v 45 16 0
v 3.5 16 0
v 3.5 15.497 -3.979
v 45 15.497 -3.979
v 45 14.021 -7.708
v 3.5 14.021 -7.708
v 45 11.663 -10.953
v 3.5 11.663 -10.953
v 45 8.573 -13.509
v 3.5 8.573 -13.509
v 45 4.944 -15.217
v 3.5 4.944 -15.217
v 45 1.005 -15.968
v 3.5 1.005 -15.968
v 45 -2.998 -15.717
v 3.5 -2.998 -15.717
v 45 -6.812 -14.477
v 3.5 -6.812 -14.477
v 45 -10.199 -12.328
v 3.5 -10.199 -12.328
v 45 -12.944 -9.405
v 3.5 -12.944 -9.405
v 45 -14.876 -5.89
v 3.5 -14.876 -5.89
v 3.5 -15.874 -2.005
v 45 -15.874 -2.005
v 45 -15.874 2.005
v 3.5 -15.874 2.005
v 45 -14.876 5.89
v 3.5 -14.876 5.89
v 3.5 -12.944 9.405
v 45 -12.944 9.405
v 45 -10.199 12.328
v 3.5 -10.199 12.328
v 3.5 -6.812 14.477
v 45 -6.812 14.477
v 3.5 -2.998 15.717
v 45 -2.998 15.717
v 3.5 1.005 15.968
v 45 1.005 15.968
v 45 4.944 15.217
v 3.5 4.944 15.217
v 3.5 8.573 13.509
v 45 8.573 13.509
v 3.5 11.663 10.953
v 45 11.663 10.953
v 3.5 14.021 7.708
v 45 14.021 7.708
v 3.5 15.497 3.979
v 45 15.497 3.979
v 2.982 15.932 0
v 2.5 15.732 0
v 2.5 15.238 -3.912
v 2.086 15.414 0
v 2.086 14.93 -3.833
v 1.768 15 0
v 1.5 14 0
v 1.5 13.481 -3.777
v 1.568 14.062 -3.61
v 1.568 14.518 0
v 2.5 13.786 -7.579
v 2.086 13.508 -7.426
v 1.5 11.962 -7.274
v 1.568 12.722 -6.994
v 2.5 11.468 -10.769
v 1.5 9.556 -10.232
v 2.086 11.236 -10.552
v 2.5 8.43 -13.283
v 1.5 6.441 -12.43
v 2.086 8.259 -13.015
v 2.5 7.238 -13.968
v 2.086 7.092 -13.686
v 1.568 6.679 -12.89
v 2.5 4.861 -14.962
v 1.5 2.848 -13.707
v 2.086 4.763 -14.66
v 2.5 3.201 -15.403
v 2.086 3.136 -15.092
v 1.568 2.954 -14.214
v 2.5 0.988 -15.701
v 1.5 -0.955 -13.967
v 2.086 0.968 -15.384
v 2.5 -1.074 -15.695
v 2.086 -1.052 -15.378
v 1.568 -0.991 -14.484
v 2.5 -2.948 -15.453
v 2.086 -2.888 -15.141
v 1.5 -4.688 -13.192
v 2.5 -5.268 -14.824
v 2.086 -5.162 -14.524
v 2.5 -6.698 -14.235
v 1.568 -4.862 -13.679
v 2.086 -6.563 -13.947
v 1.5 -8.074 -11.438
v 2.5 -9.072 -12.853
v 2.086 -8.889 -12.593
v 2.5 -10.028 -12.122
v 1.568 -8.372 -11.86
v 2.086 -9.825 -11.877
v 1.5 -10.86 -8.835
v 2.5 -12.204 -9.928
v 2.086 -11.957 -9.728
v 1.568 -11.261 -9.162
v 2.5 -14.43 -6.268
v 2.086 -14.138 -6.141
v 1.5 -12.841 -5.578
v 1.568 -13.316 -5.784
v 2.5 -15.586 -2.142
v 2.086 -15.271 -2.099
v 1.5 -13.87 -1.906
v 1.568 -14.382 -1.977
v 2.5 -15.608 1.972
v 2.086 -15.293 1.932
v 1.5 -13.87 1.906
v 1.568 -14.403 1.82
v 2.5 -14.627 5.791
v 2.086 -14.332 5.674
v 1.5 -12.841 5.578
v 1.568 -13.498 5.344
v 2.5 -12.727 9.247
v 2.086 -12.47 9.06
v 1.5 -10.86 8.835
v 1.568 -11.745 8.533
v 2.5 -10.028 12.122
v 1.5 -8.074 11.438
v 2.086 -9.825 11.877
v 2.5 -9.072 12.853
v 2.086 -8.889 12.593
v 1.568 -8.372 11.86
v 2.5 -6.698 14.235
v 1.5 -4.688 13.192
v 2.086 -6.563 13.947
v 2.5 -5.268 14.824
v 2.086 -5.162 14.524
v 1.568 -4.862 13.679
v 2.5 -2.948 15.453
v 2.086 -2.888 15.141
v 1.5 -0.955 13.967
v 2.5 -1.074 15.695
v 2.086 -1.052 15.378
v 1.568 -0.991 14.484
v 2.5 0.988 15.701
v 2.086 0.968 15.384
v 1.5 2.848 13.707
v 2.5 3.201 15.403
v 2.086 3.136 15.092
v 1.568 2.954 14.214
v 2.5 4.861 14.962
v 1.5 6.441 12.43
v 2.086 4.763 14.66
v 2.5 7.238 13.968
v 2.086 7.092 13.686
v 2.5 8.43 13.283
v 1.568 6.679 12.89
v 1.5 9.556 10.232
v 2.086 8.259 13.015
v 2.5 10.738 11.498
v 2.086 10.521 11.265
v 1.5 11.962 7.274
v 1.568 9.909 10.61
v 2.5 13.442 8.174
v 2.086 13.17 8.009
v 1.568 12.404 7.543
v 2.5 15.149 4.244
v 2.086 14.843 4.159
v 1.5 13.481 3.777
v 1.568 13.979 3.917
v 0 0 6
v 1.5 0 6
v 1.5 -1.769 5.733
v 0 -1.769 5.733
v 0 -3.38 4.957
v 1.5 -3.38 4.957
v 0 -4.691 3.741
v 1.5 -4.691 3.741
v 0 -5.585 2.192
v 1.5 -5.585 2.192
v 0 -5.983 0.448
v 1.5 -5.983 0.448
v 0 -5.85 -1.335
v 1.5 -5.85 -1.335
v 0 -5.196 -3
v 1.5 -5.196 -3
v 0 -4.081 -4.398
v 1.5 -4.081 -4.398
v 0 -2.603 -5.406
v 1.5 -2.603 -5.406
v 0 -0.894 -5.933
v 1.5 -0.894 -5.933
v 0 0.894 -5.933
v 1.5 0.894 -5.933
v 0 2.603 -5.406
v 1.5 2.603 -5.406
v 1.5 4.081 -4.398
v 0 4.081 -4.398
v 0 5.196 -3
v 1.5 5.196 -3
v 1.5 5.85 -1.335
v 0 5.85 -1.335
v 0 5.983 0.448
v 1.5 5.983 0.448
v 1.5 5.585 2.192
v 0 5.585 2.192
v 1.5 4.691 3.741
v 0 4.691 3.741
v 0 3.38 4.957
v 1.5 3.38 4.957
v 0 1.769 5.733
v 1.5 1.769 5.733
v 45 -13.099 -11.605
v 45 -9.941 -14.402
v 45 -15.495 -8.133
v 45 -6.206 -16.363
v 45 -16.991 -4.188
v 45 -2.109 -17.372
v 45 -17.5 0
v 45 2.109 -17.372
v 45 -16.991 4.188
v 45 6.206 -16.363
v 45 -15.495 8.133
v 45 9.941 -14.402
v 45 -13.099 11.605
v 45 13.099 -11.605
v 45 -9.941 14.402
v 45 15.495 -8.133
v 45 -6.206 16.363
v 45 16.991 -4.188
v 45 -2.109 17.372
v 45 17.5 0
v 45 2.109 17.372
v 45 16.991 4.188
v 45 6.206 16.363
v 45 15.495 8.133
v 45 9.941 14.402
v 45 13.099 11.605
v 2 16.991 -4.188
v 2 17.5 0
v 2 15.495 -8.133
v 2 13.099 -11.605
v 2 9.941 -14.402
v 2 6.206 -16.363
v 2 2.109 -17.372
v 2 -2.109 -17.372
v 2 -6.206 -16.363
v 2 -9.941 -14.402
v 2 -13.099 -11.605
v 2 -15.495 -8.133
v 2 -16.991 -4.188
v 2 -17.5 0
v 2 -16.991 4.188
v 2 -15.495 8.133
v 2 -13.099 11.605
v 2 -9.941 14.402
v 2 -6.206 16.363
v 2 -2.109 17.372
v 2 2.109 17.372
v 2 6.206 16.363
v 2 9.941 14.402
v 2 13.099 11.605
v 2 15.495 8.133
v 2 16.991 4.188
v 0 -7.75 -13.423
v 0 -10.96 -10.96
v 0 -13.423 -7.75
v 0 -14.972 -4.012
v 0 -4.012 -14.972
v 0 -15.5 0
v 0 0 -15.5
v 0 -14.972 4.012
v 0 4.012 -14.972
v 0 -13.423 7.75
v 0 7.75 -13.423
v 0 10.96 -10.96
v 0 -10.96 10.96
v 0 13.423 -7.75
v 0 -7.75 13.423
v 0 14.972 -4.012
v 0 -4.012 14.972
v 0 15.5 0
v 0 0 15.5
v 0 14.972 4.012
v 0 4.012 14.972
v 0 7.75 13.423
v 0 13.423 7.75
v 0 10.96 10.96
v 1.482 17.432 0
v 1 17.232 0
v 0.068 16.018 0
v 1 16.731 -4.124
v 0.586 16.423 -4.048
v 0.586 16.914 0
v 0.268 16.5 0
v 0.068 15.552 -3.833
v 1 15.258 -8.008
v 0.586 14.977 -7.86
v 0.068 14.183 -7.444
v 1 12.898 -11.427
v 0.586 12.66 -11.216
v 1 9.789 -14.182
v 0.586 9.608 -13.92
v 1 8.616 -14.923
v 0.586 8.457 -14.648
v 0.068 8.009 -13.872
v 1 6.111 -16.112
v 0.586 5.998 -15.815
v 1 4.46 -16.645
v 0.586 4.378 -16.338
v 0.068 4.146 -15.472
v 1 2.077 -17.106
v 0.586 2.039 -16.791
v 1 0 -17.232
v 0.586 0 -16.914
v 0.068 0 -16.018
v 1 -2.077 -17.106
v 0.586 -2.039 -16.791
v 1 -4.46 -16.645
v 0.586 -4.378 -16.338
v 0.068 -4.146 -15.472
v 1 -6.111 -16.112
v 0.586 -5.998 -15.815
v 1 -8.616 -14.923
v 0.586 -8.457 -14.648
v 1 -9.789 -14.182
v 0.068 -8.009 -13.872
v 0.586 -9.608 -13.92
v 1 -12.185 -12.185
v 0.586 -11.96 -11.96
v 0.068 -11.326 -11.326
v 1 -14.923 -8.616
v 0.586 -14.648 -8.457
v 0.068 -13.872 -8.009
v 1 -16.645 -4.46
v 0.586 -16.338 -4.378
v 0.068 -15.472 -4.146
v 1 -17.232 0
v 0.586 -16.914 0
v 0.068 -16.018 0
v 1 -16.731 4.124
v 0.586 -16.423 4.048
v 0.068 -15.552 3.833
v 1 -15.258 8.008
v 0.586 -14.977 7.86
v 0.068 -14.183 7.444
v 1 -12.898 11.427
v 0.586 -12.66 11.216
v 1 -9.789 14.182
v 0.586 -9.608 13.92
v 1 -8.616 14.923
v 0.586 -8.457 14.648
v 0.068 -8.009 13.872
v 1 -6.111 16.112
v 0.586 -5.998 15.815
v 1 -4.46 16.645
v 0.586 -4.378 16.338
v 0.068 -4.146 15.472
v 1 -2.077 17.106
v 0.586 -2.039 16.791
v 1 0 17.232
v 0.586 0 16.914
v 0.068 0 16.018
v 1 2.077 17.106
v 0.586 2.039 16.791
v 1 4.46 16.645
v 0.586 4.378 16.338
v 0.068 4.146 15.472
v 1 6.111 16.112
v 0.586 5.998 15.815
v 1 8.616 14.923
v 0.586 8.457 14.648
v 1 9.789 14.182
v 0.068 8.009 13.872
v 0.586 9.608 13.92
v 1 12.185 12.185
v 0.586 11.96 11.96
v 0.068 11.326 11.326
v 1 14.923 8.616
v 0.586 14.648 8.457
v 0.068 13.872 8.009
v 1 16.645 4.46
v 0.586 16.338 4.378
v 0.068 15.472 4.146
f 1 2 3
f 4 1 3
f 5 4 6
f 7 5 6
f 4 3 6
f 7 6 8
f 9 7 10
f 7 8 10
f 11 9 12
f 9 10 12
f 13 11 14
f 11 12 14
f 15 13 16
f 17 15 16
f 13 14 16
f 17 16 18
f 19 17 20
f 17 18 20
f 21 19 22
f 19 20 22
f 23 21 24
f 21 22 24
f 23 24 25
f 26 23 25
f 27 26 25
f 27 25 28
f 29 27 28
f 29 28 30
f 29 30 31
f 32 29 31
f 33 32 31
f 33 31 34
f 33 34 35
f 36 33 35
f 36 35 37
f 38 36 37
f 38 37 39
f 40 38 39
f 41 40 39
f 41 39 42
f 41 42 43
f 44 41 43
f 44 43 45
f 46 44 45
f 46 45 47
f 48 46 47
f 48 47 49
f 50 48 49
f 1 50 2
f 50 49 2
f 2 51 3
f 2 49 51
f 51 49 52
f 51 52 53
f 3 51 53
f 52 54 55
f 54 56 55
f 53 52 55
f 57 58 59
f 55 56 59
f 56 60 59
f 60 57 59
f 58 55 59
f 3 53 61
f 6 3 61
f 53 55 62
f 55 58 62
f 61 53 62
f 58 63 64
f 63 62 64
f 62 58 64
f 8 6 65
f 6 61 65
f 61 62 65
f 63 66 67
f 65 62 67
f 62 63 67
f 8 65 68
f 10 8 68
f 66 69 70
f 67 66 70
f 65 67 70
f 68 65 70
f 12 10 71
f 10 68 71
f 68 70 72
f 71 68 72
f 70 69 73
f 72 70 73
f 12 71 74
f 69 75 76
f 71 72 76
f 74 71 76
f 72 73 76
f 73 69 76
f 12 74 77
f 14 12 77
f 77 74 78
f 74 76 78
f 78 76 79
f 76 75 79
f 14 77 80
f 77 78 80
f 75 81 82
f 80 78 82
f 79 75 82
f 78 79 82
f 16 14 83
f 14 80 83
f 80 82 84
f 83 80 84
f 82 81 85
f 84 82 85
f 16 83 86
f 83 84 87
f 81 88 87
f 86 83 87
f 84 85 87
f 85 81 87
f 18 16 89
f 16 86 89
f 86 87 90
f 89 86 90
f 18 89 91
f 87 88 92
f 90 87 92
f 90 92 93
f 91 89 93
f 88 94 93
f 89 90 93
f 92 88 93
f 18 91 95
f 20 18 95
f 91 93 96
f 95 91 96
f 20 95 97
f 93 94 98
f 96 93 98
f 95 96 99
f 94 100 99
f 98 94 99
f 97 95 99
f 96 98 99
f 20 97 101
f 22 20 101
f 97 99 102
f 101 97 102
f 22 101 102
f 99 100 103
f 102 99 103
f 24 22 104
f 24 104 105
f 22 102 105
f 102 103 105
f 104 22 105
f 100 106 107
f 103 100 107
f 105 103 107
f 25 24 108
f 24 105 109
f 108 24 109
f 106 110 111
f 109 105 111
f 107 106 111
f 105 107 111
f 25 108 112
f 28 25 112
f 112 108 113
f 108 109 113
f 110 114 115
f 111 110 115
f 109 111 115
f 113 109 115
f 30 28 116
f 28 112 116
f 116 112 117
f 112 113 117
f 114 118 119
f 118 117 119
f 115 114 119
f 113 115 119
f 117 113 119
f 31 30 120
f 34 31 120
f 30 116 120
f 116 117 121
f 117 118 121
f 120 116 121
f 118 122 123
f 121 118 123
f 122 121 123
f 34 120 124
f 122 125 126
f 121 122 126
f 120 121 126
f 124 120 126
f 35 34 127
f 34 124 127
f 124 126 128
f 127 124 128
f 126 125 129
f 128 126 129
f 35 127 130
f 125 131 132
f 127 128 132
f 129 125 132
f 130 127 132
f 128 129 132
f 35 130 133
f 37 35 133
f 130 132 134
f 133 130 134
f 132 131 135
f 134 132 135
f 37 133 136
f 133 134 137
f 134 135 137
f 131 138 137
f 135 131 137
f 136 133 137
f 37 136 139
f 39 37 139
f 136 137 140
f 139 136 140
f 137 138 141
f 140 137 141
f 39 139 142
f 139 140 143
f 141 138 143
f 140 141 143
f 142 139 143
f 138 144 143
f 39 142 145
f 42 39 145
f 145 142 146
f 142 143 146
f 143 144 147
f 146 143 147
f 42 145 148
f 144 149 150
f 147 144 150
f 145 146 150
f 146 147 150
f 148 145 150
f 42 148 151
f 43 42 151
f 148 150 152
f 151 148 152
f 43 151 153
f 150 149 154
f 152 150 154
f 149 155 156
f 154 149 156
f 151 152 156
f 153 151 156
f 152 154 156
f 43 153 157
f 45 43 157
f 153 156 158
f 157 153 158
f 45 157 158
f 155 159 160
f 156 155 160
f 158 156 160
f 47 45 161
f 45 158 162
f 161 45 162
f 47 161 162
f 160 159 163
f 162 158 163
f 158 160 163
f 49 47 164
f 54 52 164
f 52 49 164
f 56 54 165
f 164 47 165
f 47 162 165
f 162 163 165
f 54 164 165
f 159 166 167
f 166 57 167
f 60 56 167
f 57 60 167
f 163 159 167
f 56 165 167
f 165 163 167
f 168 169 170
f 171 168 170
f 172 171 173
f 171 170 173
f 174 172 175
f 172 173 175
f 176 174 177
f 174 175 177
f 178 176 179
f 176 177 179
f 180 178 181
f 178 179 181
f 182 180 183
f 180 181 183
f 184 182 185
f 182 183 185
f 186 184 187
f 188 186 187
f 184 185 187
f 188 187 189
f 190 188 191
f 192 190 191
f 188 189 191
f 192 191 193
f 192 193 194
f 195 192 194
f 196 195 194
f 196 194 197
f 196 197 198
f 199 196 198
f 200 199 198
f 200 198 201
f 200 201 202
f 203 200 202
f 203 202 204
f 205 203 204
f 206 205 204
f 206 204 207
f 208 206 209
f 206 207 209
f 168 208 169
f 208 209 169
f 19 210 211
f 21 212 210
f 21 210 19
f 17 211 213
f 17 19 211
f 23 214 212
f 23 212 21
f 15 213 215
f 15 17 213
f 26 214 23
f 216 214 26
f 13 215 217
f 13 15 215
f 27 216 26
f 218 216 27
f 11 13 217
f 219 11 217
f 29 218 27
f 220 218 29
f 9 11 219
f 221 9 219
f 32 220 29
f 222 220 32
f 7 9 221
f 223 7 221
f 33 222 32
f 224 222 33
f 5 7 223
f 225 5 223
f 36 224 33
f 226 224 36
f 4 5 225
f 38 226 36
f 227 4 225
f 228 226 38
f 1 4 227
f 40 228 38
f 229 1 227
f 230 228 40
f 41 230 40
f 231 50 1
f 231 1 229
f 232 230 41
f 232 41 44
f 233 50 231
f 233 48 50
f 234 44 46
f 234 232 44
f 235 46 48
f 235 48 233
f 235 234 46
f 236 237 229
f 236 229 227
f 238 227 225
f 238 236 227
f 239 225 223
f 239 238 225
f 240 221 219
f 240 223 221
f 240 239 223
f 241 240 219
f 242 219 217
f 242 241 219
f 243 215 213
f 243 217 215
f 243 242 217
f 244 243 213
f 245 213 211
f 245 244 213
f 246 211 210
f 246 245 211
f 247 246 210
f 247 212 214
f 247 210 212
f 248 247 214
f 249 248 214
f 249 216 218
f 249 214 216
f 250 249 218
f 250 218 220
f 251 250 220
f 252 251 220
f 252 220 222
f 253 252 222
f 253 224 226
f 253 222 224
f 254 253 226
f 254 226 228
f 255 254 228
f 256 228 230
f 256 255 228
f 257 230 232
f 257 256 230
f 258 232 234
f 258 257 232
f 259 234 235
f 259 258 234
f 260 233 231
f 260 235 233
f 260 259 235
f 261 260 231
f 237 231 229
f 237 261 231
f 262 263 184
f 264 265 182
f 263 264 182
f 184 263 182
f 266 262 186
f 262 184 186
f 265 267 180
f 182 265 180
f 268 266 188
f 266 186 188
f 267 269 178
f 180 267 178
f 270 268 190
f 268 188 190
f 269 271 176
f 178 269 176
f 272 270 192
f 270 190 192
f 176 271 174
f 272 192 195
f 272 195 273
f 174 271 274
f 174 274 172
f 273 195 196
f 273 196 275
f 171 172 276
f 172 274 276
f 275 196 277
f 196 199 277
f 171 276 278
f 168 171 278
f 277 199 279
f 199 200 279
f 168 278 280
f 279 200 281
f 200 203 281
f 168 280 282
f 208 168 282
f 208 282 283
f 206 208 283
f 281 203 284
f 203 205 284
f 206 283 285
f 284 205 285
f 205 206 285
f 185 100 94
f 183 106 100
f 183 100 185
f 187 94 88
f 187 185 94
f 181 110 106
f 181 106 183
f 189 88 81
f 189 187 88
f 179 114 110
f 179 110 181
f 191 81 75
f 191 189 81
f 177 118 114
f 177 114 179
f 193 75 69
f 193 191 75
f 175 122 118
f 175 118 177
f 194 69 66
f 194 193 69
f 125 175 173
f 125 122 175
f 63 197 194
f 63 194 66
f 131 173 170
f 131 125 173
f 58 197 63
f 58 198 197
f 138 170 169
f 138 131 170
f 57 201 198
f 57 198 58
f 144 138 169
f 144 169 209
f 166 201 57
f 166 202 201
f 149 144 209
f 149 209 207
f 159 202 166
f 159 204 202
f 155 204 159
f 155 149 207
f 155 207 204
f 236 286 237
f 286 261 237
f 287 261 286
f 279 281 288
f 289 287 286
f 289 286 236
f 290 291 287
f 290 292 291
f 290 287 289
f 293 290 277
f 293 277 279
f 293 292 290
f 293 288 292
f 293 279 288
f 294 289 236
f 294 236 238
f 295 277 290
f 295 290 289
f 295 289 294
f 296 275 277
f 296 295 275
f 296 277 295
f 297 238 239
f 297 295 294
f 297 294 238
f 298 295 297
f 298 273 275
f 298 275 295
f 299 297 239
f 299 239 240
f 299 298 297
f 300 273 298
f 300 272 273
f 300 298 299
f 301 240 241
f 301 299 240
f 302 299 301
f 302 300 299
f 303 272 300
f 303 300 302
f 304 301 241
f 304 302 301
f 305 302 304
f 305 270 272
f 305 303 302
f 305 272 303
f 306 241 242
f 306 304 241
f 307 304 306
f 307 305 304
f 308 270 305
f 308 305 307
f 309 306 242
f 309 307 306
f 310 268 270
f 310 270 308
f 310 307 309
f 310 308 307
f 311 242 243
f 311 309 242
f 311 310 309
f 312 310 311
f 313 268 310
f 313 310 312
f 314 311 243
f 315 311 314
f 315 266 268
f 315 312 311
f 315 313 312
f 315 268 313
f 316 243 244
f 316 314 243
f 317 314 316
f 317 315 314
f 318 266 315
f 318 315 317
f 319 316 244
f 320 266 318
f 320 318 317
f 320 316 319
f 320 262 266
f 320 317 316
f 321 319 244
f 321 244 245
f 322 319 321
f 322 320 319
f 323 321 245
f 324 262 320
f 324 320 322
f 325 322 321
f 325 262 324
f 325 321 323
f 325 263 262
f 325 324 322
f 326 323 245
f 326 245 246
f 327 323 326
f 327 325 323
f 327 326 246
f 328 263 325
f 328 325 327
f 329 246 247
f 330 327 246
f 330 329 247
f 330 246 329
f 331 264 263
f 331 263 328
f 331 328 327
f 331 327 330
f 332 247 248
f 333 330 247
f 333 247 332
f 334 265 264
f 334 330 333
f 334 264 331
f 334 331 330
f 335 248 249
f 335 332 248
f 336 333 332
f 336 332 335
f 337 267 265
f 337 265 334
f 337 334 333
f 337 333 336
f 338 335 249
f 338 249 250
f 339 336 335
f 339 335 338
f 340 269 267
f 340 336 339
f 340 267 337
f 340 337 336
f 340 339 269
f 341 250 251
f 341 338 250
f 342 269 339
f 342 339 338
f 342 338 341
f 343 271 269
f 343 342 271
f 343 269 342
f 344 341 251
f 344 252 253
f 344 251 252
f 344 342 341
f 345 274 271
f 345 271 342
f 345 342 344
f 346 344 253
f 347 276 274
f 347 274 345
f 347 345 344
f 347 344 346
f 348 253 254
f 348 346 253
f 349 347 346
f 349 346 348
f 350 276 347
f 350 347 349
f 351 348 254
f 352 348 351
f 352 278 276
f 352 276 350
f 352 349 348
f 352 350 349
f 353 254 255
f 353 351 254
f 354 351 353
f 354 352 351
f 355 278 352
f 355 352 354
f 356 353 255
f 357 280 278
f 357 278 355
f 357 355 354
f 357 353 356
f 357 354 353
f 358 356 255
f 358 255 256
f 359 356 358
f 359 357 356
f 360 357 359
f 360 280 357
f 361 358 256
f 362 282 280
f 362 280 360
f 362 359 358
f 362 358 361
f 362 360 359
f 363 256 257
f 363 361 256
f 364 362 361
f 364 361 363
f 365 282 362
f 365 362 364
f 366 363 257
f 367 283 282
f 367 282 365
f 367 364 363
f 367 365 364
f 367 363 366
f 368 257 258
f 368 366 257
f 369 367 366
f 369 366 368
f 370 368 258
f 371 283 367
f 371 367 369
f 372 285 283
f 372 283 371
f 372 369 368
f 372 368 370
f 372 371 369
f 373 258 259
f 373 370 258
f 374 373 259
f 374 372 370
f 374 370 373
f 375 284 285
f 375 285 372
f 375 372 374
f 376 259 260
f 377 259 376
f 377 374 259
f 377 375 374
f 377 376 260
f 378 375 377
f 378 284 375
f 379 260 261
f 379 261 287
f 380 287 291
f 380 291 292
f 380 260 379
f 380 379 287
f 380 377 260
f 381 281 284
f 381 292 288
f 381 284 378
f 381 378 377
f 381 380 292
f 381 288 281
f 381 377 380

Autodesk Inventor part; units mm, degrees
ref_plane "YZ Plane" through (0, 0, 0) normal (1, 0, 0) x (0, 1, 0)
ref_plane "XZ Plane" through (0, 0, 0) normal (0, 1, 0) x (-1, 0, 0)
ref_plane "XY Plane" through (0, 0, 0) normal (0, 0, 1) x (1, 0, 0)
sketch "Sketch1" plane through (0, 0, 0) normal (1, 0, 0) x (0, 1, 0)
  circle A0 centre (0, 0) radius 17.5
  dimension "d0" = 35
extrude "Extrusion1" add sketch "Sketch1" along normal blind 45
shell "Shell1" thickness 1.5 removed faces 1 at (45, 4.865, -5.1831)
sketch "Sketch2" plane through (0, 0, 0) normal (-1, 0, 0) x (0, 0, 1)
  point P0 (0, 0)
hole "Hole1" at (0, 0, 0) direction (1, 0, 0) diameter 12 end through all
fillet "Fillet1" radius 2 2 edges at (0, -17.5, 0) (1.5, -16, 0)
properties material "Steel, Mild"
